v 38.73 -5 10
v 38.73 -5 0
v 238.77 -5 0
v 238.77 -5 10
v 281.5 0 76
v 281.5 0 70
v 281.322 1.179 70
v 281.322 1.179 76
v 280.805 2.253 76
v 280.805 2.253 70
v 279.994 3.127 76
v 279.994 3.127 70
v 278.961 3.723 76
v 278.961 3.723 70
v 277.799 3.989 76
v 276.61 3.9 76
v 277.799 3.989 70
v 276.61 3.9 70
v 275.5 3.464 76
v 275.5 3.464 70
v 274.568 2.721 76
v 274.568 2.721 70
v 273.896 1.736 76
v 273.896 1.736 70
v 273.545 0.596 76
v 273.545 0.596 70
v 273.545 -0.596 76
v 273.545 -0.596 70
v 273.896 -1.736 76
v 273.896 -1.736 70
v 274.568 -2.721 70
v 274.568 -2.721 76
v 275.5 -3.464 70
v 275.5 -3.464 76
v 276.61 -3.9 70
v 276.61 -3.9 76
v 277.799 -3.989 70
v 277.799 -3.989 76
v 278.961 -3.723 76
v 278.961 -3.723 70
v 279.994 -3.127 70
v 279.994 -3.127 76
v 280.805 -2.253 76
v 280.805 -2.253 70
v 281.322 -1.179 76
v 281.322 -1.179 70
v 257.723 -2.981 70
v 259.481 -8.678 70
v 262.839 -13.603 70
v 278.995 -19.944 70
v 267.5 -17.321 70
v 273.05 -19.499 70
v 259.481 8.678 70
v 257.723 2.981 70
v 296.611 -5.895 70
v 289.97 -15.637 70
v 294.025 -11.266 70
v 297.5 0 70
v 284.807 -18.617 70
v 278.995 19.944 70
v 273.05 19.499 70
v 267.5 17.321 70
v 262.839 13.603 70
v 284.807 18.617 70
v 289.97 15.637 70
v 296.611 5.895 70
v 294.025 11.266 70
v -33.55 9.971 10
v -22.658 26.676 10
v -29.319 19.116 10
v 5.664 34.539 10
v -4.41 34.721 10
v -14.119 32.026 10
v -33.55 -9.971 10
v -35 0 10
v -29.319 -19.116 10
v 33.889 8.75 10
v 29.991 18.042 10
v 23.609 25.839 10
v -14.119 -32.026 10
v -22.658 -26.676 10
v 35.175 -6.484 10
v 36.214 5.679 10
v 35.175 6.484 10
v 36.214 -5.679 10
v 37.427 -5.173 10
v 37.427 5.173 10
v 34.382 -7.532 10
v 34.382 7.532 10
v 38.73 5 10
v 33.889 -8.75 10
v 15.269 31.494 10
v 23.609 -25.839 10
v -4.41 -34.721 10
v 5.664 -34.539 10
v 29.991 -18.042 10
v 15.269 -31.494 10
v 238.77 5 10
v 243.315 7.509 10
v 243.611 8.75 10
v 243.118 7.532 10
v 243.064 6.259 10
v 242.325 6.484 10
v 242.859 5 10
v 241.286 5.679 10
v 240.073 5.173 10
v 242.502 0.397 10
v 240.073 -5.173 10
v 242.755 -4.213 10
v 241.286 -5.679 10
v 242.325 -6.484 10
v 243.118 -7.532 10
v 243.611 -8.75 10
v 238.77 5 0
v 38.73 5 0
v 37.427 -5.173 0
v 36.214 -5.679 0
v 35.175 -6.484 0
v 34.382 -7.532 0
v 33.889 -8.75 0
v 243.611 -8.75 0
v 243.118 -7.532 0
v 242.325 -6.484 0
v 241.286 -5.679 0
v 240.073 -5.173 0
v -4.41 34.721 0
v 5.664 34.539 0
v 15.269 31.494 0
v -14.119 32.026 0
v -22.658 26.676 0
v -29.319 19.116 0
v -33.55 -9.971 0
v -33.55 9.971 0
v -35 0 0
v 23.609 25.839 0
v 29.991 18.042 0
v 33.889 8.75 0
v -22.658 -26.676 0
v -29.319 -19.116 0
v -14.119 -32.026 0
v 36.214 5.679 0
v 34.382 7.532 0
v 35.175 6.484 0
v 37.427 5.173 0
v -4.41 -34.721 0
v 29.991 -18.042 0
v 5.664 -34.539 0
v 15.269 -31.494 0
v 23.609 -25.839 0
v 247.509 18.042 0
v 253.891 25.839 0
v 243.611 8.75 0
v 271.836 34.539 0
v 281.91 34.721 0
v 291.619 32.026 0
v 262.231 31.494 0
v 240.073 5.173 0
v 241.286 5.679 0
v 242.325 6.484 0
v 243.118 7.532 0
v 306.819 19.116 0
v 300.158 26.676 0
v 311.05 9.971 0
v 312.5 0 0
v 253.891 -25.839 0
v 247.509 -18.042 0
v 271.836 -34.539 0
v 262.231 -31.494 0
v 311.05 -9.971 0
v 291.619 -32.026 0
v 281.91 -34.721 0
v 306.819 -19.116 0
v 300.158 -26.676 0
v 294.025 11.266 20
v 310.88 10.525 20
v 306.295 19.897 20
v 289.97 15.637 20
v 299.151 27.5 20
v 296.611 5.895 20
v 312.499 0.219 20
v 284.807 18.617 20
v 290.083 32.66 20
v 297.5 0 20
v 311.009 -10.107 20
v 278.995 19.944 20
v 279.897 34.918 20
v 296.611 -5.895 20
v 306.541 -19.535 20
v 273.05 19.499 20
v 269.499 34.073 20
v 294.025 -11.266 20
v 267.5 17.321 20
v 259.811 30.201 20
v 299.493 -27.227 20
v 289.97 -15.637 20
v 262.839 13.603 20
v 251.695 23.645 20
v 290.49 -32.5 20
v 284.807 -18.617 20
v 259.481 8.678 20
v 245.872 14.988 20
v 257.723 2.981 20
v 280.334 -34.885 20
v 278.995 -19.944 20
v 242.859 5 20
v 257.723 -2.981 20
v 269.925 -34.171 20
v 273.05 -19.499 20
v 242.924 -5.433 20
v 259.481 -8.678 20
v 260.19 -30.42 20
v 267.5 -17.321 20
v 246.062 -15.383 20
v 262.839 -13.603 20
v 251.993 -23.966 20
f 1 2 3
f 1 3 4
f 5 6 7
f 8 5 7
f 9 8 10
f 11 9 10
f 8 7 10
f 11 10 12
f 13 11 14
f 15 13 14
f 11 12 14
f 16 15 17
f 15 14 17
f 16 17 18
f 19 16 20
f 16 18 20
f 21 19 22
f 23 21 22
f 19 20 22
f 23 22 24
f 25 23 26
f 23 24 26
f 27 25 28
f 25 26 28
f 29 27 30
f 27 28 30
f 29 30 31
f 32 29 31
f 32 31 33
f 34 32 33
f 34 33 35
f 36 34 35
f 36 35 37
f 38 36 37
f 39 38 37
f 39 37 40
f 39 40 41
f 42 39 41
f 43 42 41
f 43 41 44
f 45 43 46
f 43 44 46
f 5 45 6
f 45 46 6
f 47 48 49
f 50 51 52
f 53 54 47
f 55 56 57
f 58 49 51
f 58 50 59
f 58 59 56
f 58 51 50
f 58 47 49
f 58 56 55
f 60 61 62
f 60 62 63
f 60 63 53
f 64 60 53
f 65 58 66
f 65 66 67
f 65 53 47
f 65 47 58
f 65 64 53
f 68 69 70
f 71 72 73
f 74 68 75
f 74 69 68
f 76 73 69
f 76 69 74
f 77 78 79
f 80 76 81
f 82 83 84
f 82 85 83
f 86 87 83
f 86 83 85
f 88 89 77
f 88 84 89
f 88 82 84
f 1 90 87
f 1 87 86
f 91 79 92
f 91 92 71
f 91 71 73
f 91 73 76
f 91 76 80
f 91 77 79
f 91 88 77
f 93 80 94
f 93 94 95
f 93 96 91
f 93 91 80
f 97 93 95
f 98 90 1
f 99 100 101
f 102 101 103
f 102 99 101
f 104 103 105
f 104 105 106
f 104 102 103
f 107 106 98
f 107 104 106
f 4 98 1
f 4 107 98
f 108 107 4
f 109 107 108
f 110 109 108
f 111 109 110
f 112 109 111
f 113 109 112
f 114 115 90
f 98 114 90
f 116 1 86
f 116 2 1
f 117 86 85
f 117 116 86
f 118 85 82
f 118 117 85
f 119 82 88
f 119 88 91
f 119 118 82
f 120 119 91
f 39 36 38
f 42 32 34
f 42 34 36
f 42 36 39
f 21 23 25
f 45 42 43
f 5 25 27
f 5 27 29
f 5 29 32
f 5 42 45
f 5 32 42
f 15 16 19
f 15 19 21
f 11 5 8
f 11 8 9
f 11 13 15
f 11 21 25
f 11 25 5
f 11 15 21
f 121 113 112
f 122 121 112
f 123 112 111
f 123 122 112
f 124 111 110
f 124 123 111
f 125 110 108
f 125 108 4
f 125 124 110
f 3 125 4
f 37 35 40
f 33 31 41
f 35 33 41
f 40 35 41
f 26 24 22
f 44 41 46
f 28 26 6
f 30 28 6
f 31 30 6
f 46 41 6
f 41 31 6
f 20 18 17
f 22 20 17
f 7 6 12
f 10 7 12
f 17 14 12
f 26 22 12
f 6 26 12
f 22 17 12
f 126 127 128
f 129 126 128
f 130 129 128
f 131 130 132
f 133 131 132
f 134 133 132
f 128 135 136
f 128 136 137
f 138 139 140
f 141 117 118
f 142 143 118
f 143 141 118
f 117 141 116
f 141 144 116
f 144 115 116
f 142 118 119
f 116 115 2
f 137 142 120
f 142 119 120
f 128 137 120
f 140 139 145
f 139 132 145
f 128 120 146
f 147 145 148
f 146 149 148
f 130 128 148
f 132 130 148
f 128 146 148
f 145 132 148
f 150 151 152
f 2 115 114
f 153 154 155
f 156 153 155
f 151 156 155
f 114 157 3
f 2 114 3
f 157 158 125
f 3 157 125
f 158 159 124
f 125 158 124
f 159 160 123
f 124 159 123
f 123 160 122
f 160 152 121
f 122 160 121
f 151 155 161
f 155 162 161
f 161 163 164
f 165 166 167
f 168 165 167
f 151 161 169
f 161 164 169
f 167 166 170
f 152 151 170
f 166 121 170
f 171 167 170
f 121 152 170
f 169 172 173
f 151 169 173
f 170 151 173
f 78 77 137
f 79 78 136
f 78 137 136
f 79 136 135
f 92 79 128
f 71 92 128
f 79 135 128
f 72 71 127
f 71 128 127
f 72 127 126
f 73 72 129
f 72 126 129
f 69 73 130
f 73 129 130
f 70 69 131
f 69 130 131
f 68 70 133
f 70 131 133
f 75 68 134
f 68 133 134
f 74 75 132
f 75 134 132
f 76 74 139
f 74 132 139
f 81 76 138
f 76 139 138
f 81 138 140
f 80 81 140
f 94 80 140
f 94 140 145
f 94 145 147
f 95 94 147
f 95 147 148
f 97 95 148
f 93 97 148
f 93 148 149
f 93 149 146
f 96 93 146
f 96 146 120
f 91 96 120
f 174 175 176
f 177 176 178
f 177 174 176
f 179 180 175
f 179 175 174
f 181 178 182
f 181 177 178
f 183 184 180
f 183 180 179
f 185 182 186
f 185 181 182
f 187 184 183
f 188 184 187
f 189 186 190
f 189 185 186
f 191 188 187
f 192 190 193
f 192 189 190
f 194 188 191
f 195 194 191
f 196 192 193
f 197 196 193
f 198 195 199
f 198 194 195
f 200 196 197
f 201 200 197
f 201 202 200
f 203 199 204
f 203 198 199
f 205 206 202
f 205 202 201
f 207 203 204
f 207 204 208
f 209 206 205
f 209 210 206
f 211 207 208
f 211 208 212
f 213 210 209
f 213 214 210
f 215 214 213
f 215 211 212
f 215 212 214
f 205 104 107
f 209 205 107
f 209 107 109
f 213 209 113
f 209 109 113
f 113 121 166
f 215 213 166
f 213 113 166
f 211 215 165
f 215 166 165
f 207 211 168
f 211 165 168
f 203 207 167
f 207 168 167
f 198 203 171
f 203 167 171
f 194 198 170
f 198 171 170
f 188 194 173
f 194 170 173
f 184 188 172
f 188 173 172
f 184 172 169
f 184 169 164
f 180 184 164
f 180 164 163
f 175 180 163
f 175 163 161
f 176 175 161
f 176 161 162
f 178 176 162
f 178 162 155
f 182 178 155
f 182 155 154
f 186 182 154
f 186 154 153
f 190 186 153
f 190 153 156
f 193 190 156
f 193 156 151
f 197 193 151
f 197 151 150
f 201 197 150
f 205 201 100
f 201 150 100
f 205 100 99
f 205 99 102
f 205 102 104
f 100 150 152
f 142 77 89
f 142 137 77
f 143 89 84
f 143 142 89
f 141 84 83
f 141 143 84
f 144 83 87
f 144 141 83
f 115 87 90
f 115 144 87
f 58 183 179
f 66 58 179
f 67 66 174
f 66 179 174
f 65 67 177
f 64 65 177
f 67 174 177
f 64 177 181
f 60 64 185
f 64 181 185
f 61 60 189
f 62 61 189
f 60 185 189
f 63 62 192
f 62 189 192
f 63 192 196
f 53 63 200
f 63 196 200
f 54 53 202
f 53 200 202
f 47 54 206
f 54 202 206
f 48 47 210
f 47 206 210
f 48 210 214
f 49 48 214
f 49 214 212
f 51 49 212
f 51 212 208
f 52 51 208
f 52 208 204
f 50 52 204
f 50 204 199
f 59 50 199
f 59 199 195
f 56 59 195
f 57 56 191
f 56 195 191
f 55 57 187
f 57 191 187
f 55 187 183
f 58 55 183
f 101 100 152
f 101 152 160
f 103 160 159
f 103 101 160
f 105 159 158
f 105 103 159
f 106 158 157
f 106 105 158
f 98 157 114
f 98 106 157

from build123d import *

# Parameters (mm, degrees)
ESBO_O1_R                     = 35
RESSALTO_EXTRUS_O1_DEPTH      = 10
ESBO_O4_W                     = 10
ESBO_O4_H                     = 10
RESSALTO_EXTRUS_O2_DEPTH      = 277.5
FILETE3_R                     = 5
FILETE4_R                     = 5
RESSALTO_EXTRUS_O3_DEPTH      = 10
RESSALTO_EXTRUS_O3_DEPTH_BACK = 10
ESBO_O6_R                     = 35
FILETE5_R                     = 5
FILETE6_R                     = 5
ESBO_O7_R                     = 20
RESSALTO_EXTRUS_O4_DEPTH      = 50
SMLINK_BETA_CIRCLE_R          = 4
SMLINK_BETA_CYLINDER_DEPTH    = 6


with BuildPart() as part:
    # Esboço1 → Ressalto-extrusão1 (new body)
    with BuildSketch(Plane(origin=(0, 0, 0), x_dir=(0, 1, 0), z_dir=(0, 0, 1))):
        with Locations(Location((0, 0, 0), (0, 0, 270))):
            Circle(ESBO_O1_R)
    extrude(amount=RESSALTO_EXTRUS_O1_DEPTH)

    # Esboço4 → Ressalto-extrusão2 (add)
    with BuildSketch(Plane.YZ):
        with Locations((0, 5)):
            Rectangle(ESBO_O4_W, ESBO_O4_H)
    extrude(amount=RESSALTO_EXTRUS_O2_DEPTH)

    # Filete3
    filete3_edges = [part.edges().sort_by_distance(p)[0] for p in [
        (34.641016151, -5, 5),
    ]]
    fillet(filete3_edges, radius=FILETE3_R)

    # Filete4
    filete4_edges = [part.edges().sort_by_distance(p)[0] for p in [
        (34.641016151, 5, 5),
    ]]
    fillet(filete4_edges, radius=FILETE4_R)

    # Esboço6 → Ressalto-extrusão3 (add, two sides: drawn at the far end of the back side and taken through both)
    with BuildSketch(Plane.XY.offset(10).offset(-RESSALTO_EXTRUS_O3_DEPTH_BACK)):
        with Locations(Location((277.5, 0, 0), (0, 0, 171.786789298))):
            Circle(ESBO_O6_R)
    extrude(amount=RESSALTO_EXTRUS_O3_DEPTH + RESSALTO_EXTRUS_O3_DEPTH_BACK)

    # Filete5
    filete5_edges = [part.edges().sort_by_distance(p)[0] for p in [
        (242.858983849, -5, 5),
    ]]
    fillet(filete5_edges, radius=FILETE5_R)

    # Filete6
    # the kernel refuses this fillet: 5 mm, written as the material it adds along each edge
    with BuildSketch(Plane(origin=(242.858983849, 5, 10), x_dir=(0.1967224418008006, 0.9804592193925918, 0), z_dir=(0, 0, -1))) as filete6_piece_1:
        with BuildLine():
            CenterArc((4.097933971, -4.992530838), FILETE6_R, 93.132150742, 75.522487814)
            Line((-0.804362126, -4.008918629), (0, 0))
            ThreePointArc((0, 0), (1.912369187, -0.052284136), (3.824738373, 0))
        make_face()
    extrude(amount=10)

    # Esboço7 → Ressalto-extrusão4 (add)
    with BuildSketch(Plane.XY.offset(20)):
        with Locations((277.5, 0)):
            Circle(ESBO_O7_R)
    extrude(amount=RESSALTO_EXTRUS_O4_DEPTH)


with BuildPart() as body_2:
    # SMLINK_BETA_CIRCLE → SMLINK_BETA_CYLINDER (new body)
    with BuildSketch(Plane(origin=(0, 0, 70), x_dir=(0, 1, 0), z_dir=(0, 0, 1))):
        with Locations(Location((0, -277.5, 0), (0, 0, 270))):
            Circle(SMLINK_BETA_CIRCLE_R)
    extrude(amount=SMLINK_BETA_CYLINDER_DEPTH)


solid = Compound([part.part, body_2.part])
